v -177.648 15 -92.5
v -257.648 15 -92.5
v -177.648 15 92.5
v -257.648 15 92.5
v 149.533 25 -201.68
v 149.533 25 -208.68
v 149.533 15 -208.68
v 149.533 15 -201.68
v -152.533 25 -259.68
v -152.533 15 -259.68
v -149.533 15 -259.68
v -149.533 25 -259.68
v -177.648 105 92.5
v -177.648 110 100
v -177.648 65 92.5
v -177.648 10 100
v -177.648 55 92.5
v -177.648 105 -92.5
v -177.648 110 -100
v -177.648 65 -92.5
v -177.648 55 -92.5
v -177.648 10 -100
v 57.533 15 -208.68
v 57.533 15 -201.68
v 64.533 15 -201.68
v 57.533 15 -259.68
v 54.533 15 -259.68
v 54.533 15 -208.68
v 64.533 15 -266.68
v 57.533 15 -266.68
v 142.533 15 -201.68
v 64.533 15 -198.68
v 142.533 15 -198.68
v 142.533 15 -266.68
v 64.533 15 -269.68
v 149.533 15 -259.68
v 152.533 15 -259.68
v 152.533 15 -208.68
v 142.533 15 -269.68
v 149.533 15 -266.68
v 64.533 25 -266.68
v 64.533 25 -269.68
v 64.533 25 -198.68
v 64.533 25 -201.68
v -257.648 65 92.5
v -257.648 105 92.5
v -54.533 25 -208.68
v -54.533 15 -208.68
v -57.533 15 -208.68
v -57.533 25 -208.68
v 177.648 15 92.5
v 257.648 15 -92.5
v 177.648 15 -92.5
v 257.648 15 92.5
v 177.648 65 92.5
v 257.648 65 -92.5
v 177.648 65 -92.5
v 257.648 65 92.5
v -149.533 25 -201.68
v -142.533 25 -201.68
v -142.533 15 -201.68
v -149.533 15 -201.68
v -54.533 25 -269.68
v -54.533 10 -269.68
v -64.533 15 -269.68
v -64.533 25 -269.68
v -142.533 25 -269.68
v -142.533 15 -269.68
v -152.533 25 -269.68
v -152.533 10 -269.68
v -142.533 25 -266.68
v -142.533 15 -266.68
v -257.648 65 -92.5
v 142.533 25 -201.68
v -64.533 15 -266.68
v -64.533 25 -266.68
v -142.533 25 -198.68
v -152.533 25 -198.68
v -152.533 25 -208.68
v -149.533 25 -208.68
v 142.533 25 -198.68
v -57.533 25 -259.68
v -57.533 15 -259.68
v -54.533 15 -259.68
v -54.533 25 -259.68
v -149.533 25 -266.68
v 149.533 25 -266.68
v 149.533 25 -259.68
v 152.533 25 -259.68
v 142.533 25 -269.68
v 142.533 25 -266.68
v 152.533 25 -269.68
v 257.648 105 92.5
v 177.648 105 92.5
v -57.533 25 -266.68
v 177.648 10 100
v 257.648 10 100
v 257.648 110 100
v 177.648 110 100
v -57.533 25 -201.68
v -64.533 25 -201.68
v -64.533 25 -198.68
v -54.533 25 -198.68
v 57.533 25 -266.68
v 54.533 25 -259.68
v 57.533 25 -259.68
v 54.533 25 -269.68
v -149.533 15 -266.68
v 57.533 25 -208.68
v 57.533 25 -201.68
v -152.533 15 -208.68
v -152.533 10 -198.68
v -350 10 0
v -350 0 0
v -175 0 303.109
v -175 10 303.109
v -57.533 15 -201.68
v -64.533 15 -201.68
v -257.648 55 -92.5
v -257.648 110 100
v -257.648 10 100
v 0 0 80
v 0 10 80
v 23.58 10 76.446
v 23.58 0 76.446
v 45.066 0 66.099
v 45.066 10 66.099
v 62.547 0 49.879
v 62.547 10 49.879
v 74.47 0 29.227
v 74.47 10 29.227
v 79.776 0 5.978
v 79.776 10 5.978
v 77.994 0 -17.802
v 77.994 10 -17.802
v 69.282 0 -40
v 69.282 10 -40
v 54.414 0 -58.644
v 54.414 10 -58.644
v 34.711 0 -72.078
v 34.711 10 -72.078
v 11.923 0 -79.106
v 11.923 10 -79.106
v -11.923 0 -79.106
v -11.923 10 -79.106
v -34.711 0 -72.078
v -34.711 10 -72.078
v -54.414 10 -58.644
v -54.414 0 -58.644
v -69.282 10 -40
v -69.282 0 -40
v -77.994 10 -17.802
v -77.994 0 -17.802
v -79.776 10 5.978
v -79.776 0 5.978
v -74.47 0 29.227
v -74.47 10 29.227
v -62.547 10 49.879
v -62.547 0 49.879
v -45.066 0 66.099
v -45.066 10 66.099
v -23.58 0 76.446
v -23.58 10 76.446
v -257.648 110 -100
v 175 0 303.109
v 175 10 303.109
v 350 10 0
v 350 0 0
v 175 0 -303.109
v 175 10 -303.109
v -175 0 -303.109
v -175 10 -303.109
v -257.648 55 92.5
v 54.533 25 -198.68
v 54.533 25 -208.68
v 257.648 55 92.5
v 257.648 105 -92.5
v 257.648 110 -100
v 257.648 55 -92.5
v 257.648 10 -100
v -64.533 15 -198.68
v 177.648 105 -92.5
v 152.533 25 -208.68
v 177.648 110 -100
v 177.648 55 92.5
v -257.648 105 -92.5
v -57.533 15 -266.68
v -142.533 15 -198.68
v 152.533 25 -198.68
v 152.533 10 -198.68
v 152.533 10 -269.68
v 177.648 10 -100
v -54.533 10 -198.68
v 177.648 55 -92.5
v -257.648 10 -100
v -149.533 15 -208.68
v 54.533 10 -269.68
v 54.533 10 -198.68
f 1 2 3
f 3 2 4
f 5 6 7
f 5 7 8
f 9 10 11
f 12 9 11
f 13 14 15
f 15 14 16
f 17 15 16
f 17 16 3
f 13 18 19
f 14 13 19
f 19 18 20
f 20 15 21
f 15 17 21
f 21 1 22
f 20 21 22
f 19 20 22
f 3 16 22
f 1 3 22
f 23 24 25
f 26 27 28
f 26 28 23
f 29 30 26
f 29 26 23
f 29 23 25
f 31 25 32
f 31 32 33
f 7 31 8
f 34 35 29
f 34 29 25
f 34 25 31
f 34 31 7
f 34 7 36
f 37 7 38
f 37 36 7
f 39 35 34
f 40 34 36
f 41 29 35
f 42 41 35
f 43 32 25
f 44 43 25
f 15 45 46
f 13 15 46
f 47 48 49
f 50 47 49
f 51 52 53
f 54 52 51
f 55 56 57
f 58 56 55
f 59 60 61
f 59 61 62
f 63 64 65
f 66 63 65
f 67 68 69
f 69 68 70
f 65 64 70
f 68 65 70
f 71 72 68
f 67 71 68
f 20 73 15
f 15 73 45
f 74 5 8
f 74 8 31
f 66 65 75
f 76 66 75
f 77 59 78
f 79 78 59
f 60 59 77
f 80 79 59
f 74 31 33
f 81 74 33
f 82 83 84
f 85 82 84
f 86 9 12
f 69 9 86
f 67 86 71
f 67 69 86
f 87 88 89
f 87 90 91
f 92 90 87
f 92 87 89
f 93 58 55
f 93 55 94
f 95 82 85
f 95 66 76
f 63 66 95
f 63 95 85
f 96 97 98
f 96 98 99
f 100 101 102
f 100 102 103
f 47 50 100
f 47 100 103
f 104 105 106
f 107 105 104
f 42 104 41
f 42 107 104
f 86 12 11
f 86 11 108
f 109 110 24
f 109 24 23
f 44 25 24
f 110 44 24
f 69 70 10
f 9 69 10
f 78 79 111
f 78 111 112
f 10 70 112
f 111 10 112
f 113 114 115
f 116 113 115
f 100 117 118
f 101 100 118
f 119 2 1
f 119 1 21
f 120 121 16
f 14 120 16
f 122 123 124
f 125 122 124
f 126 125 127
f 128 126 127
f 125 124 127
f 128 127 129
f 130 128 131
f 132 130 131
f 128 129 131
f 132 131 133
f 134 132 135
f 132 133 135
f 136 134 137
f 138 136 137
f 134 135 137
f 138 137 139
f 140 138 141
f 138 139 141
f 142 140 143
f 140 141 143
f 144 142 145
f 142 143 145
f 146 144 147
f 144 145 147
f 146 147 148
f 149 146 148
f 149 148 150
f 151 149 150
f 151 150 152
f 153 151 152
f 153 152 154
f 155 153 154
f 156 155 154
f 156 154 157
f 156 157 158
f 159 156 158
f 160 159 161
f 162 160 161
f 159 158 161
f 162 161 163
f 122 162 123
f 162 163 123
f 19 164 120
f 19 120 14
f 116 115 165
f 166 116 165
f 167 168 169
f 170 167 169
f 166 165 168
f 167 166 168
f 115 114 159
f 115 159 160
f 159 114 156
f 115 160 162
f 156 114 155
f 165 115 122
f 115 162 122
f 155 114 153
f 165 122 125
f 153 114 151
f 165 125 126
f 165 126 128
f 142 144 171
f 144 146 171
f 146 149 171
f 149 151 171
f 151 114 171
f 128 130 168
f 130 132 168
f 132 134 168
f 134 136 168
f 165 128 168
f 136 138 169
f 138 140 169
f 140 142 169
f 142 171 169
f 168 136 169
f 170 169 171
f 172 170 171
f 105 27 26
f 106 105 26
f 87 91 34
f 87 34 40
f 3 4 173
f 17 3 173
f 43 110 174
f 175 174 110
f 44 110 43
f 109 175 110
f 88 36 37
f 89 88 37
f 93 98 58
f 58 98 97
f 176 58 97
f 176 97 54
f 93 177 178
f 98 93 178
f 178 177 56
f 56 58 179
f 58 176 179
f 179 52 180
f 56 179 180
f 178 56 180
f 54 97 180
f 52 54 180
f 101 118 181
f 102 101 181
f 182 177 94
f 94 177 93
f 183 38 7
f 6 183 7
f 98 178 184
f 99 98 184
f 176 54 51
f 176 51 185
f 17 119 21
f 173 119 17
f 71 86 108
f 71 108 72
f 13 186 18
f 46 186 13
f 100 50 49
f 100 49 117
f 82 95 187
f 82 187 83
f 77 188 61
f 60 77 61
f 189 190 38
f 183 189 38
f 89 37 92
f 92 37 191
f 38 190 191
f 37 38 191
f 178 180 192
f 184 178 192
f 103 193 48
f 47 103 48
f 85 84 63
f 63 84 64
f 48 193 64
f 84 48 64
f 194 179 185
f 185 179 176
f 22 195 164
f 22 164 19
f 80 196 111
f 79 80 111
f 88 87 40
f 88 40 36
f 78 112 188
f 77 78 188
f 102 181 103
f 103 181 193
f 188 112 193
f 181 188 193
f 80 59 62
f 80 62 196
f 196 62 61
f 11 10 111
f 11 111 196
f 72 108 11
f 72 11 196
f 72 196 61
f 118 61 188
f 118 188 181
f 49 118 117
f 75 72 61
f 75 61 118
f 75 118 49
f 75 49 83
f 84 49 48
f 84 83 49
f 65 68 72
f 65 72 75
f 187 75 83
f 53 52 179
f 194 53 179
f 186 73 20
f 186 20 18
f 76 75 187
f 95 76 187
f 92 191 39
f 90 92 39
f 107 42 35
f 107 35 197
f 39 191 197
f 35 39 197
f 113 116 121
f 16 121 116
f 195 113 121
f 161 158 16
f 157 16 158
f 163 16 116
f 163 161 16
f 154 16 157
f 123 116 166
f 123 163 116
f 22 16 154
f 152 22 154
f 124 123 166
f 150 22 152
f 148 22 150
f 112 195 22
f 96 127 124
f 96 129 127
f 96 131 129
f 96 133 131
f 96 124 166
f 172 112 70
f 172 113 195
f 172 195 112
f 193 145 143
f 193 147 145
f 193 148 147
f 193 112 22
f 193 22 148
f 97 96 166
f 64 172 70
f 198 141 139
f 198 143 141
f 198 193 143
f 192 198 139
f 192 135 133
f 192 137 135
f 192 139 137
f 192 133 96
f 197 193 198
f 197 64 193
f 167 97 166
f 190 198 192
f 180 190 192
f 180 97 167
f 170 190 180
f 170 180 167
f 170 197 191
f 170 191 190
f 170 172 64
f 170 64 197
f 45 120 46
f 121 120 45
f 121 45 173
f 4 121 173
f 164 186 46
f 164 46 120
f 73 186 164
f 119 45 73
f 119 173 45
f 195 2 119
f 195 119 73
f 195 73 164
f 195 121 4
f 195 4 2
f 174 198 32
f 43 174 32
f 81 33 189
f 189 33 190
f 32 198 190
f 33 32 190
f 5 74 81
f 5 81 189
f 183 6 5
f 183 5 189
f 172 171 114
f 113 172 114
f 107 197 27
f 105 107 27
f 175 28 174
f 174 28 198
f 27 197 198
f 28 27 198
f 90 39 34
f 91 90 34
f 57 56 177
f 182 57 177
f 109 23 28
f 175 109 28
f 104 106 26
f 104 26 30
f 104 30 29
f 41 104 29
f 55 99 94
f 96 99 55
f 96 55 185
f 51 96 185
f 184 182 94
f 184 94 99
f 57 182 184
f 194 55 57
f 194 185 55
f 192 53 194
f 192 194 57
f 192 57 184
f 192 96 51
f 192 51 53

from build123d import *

# Parameters (mm, degrees)
BOSS_EXTRUDE1_DEPTH = 10
BOSS_EXTRUDE2_DEPTH = 15
SKETCH3_R           = 80
CUT_EXTRUDE1_DEPTH  = 10
SKETCH4_W           = 98
SKETCH4_H           = 71
BOSS_EXTRUDE3_DEPTH = 5
SKETCH5_W           = 80
SKETCH5_H           = 200
BOSS_EXTRUDE4_DEPTH = 100
SKETCH6_W           = 185
SKETCH6_H           = 40
CUT_EXTRUDE2_DEPTH  = 80


with BuildPart() as part:
    # Sketch1 → Boss-Extrude1 (new body)
    with BuildSketch(Plane(origin=(0, 0, 0), x_dir=(1, 0, 0), z_dir=(0, 1, 0))):
        Polygon((350, 0), (175, 303.108891325), (-175, 303.108891325), (-350, 0), (-175, -303.108891325), (175, -303.108891325), align=None)
    extrude(amount=BOSS_EXTRUDE1_DEPTH)

    # Sketch2 → Boss-Extrude2 (add)
    with BuildSketch(Plane(origin=(0, 10, 0), x_dir=(1, 0, 0), z_dir=(0, 1, 0))):
        Polygon((54.532889038, 198.679724117), (64.532889038, 198.679724117), (64.532889038, 201.679724117), (57.532889038, 201.679724117), (57.532889038, 208.679724117), (54.532889038, 208.679724117), align=None)
        Polygon((142.532889038, 201.679724117), (142.532889038, 198.679724117), (152.532889038, 198.679724117), (152.532889038, 208.679724117), (149.532889038, 208.679724117), (149.532889038, 201.679724117), align=None)
        Polygon((54.532889038, 259.679724117), (57.532889038, 259.679724117), (57.532889038, 266.679724117), (64.532889038, 266.679724117), (64.532889038, 269.679724117), (54.532889038, 269.679724117), align=None)
        Polygon((149.532889038, 259.679724117), (152.532889038, 259.679724117), (152.532889038, 269.679724117), (142.532889038, 269.679724117), (142.532889038, 266.679724117), (149.532889038, 266.679724117), align=None)
        Polygon((-64.532889038, 201.679724117), (-64.532889038, 198.679724117), (-54.532889038, 198.679724117), (-54.532889038, 208.679724117), (-57.532889038, 208.679724117), (-57.532889038, 201.679724117), align=None)
        Polygon((-142.532889038, 198.679724117), (-142.532889038, 201.679724117), (-149.532889038, 201.679724117), (-149.532889038, 208.679724117), (-152.532889038, 208.679724117), (-152.532889038, 198.679724117), align=None)
        Polygon((-152.532889038, 259.679724117), (-149.532889038, 259.679724117), (-149.532889038, 266.679724117), (-142.532889038, 266.679724117), (-142.532889038, 269.679724117), (-152.532889038, 269.679724117), align=None)
        Polygon((-57.532889038, 259.679724117), (-54.532889038, 259.679724117), (-54.532889038, 269.679724117), (-64.532889038, 269.679724117), (-64.532889038, 266.679724117), (-57.532889038, 266.679724117), align=None)
    extrude(amount=BOSS_EXTRUDE2_DEPTH)

    # Sketch3 → Cut-Extrude1 (cut)
    with BuildSketch(Plane(origin=(0, 10, 0), x_dir=(1, 0, 0), z_dir=(0, 1, 0))):
        with Locations(Location((0, 0, 0), (0, 0, 270))):
            Circle(SKETCH3_R)
    extrude(amount=-CUT_EXTRUDE1_DEPTH, mode=Mode.SUBTRACT)

    # Sketch4 → Boss-Extrude3 (add)
    with BuildSketch(Plane(origin=(0, 10, 0), x_dir=(1, 0, 0), z_dir=(0, 1, 0))):
        with Locations((-103.532889038, 234.179724117)):
            Rectangle(SKETCH4_W, SKETCH4_H)
        with Locations((103.532889038, 234.179724117)):
            Rectangle(SKETCH4_W, SKETCH4_H)
    extrude(amount=BOSS_EXTRUDE3_DEPTH)

    # Sketch5 → Boss-Extrude4 (add)
    with BuildSketch(Plane(origin=(0, 10, 0), x_dir=(1, 0, 0), z_dir=(0, 1, 0))):
        with Locations((-217.647690378, 0)):
            Rectangle(SKETCH5_W, SKETCH5_H)
    boss_extrude4 = extrude(amount=BOSS_EXTRUDE4_DEPTH)

    # Sketch6 → Cut-Extrude2 (cut)
    with BuildSketch(Plane.ZY.offset(257.647690378)):
        with Locations((0, 35)):
            Rectangle(SKETCH6_W, SKETCH6_H)
        with Locations((0, 85)):
            Rectangle(SKETCH6_W, SKETCH6_H)
    cut_extrude2 = extrude(amount=-CUT_EXTRUDE2_DEPTH, mode=Mode.SUBTRACT)

    # Mirror1: Boss-Extrude4, Cut-Extrude2 across plane
    add(boss_extrude4.mirror(Plane(origin=(0, 0, 0), x_dir=(0, 0, 1), z_dir=(1, 0, 0))))
    add(cut_extrude2.mirror(Plane(origin=(0, 0, 0), x_dir=(0, 0, 1), z_dir=(1, 0, 0))), mode=Mode.SUBTRACT)


solid = part.part
